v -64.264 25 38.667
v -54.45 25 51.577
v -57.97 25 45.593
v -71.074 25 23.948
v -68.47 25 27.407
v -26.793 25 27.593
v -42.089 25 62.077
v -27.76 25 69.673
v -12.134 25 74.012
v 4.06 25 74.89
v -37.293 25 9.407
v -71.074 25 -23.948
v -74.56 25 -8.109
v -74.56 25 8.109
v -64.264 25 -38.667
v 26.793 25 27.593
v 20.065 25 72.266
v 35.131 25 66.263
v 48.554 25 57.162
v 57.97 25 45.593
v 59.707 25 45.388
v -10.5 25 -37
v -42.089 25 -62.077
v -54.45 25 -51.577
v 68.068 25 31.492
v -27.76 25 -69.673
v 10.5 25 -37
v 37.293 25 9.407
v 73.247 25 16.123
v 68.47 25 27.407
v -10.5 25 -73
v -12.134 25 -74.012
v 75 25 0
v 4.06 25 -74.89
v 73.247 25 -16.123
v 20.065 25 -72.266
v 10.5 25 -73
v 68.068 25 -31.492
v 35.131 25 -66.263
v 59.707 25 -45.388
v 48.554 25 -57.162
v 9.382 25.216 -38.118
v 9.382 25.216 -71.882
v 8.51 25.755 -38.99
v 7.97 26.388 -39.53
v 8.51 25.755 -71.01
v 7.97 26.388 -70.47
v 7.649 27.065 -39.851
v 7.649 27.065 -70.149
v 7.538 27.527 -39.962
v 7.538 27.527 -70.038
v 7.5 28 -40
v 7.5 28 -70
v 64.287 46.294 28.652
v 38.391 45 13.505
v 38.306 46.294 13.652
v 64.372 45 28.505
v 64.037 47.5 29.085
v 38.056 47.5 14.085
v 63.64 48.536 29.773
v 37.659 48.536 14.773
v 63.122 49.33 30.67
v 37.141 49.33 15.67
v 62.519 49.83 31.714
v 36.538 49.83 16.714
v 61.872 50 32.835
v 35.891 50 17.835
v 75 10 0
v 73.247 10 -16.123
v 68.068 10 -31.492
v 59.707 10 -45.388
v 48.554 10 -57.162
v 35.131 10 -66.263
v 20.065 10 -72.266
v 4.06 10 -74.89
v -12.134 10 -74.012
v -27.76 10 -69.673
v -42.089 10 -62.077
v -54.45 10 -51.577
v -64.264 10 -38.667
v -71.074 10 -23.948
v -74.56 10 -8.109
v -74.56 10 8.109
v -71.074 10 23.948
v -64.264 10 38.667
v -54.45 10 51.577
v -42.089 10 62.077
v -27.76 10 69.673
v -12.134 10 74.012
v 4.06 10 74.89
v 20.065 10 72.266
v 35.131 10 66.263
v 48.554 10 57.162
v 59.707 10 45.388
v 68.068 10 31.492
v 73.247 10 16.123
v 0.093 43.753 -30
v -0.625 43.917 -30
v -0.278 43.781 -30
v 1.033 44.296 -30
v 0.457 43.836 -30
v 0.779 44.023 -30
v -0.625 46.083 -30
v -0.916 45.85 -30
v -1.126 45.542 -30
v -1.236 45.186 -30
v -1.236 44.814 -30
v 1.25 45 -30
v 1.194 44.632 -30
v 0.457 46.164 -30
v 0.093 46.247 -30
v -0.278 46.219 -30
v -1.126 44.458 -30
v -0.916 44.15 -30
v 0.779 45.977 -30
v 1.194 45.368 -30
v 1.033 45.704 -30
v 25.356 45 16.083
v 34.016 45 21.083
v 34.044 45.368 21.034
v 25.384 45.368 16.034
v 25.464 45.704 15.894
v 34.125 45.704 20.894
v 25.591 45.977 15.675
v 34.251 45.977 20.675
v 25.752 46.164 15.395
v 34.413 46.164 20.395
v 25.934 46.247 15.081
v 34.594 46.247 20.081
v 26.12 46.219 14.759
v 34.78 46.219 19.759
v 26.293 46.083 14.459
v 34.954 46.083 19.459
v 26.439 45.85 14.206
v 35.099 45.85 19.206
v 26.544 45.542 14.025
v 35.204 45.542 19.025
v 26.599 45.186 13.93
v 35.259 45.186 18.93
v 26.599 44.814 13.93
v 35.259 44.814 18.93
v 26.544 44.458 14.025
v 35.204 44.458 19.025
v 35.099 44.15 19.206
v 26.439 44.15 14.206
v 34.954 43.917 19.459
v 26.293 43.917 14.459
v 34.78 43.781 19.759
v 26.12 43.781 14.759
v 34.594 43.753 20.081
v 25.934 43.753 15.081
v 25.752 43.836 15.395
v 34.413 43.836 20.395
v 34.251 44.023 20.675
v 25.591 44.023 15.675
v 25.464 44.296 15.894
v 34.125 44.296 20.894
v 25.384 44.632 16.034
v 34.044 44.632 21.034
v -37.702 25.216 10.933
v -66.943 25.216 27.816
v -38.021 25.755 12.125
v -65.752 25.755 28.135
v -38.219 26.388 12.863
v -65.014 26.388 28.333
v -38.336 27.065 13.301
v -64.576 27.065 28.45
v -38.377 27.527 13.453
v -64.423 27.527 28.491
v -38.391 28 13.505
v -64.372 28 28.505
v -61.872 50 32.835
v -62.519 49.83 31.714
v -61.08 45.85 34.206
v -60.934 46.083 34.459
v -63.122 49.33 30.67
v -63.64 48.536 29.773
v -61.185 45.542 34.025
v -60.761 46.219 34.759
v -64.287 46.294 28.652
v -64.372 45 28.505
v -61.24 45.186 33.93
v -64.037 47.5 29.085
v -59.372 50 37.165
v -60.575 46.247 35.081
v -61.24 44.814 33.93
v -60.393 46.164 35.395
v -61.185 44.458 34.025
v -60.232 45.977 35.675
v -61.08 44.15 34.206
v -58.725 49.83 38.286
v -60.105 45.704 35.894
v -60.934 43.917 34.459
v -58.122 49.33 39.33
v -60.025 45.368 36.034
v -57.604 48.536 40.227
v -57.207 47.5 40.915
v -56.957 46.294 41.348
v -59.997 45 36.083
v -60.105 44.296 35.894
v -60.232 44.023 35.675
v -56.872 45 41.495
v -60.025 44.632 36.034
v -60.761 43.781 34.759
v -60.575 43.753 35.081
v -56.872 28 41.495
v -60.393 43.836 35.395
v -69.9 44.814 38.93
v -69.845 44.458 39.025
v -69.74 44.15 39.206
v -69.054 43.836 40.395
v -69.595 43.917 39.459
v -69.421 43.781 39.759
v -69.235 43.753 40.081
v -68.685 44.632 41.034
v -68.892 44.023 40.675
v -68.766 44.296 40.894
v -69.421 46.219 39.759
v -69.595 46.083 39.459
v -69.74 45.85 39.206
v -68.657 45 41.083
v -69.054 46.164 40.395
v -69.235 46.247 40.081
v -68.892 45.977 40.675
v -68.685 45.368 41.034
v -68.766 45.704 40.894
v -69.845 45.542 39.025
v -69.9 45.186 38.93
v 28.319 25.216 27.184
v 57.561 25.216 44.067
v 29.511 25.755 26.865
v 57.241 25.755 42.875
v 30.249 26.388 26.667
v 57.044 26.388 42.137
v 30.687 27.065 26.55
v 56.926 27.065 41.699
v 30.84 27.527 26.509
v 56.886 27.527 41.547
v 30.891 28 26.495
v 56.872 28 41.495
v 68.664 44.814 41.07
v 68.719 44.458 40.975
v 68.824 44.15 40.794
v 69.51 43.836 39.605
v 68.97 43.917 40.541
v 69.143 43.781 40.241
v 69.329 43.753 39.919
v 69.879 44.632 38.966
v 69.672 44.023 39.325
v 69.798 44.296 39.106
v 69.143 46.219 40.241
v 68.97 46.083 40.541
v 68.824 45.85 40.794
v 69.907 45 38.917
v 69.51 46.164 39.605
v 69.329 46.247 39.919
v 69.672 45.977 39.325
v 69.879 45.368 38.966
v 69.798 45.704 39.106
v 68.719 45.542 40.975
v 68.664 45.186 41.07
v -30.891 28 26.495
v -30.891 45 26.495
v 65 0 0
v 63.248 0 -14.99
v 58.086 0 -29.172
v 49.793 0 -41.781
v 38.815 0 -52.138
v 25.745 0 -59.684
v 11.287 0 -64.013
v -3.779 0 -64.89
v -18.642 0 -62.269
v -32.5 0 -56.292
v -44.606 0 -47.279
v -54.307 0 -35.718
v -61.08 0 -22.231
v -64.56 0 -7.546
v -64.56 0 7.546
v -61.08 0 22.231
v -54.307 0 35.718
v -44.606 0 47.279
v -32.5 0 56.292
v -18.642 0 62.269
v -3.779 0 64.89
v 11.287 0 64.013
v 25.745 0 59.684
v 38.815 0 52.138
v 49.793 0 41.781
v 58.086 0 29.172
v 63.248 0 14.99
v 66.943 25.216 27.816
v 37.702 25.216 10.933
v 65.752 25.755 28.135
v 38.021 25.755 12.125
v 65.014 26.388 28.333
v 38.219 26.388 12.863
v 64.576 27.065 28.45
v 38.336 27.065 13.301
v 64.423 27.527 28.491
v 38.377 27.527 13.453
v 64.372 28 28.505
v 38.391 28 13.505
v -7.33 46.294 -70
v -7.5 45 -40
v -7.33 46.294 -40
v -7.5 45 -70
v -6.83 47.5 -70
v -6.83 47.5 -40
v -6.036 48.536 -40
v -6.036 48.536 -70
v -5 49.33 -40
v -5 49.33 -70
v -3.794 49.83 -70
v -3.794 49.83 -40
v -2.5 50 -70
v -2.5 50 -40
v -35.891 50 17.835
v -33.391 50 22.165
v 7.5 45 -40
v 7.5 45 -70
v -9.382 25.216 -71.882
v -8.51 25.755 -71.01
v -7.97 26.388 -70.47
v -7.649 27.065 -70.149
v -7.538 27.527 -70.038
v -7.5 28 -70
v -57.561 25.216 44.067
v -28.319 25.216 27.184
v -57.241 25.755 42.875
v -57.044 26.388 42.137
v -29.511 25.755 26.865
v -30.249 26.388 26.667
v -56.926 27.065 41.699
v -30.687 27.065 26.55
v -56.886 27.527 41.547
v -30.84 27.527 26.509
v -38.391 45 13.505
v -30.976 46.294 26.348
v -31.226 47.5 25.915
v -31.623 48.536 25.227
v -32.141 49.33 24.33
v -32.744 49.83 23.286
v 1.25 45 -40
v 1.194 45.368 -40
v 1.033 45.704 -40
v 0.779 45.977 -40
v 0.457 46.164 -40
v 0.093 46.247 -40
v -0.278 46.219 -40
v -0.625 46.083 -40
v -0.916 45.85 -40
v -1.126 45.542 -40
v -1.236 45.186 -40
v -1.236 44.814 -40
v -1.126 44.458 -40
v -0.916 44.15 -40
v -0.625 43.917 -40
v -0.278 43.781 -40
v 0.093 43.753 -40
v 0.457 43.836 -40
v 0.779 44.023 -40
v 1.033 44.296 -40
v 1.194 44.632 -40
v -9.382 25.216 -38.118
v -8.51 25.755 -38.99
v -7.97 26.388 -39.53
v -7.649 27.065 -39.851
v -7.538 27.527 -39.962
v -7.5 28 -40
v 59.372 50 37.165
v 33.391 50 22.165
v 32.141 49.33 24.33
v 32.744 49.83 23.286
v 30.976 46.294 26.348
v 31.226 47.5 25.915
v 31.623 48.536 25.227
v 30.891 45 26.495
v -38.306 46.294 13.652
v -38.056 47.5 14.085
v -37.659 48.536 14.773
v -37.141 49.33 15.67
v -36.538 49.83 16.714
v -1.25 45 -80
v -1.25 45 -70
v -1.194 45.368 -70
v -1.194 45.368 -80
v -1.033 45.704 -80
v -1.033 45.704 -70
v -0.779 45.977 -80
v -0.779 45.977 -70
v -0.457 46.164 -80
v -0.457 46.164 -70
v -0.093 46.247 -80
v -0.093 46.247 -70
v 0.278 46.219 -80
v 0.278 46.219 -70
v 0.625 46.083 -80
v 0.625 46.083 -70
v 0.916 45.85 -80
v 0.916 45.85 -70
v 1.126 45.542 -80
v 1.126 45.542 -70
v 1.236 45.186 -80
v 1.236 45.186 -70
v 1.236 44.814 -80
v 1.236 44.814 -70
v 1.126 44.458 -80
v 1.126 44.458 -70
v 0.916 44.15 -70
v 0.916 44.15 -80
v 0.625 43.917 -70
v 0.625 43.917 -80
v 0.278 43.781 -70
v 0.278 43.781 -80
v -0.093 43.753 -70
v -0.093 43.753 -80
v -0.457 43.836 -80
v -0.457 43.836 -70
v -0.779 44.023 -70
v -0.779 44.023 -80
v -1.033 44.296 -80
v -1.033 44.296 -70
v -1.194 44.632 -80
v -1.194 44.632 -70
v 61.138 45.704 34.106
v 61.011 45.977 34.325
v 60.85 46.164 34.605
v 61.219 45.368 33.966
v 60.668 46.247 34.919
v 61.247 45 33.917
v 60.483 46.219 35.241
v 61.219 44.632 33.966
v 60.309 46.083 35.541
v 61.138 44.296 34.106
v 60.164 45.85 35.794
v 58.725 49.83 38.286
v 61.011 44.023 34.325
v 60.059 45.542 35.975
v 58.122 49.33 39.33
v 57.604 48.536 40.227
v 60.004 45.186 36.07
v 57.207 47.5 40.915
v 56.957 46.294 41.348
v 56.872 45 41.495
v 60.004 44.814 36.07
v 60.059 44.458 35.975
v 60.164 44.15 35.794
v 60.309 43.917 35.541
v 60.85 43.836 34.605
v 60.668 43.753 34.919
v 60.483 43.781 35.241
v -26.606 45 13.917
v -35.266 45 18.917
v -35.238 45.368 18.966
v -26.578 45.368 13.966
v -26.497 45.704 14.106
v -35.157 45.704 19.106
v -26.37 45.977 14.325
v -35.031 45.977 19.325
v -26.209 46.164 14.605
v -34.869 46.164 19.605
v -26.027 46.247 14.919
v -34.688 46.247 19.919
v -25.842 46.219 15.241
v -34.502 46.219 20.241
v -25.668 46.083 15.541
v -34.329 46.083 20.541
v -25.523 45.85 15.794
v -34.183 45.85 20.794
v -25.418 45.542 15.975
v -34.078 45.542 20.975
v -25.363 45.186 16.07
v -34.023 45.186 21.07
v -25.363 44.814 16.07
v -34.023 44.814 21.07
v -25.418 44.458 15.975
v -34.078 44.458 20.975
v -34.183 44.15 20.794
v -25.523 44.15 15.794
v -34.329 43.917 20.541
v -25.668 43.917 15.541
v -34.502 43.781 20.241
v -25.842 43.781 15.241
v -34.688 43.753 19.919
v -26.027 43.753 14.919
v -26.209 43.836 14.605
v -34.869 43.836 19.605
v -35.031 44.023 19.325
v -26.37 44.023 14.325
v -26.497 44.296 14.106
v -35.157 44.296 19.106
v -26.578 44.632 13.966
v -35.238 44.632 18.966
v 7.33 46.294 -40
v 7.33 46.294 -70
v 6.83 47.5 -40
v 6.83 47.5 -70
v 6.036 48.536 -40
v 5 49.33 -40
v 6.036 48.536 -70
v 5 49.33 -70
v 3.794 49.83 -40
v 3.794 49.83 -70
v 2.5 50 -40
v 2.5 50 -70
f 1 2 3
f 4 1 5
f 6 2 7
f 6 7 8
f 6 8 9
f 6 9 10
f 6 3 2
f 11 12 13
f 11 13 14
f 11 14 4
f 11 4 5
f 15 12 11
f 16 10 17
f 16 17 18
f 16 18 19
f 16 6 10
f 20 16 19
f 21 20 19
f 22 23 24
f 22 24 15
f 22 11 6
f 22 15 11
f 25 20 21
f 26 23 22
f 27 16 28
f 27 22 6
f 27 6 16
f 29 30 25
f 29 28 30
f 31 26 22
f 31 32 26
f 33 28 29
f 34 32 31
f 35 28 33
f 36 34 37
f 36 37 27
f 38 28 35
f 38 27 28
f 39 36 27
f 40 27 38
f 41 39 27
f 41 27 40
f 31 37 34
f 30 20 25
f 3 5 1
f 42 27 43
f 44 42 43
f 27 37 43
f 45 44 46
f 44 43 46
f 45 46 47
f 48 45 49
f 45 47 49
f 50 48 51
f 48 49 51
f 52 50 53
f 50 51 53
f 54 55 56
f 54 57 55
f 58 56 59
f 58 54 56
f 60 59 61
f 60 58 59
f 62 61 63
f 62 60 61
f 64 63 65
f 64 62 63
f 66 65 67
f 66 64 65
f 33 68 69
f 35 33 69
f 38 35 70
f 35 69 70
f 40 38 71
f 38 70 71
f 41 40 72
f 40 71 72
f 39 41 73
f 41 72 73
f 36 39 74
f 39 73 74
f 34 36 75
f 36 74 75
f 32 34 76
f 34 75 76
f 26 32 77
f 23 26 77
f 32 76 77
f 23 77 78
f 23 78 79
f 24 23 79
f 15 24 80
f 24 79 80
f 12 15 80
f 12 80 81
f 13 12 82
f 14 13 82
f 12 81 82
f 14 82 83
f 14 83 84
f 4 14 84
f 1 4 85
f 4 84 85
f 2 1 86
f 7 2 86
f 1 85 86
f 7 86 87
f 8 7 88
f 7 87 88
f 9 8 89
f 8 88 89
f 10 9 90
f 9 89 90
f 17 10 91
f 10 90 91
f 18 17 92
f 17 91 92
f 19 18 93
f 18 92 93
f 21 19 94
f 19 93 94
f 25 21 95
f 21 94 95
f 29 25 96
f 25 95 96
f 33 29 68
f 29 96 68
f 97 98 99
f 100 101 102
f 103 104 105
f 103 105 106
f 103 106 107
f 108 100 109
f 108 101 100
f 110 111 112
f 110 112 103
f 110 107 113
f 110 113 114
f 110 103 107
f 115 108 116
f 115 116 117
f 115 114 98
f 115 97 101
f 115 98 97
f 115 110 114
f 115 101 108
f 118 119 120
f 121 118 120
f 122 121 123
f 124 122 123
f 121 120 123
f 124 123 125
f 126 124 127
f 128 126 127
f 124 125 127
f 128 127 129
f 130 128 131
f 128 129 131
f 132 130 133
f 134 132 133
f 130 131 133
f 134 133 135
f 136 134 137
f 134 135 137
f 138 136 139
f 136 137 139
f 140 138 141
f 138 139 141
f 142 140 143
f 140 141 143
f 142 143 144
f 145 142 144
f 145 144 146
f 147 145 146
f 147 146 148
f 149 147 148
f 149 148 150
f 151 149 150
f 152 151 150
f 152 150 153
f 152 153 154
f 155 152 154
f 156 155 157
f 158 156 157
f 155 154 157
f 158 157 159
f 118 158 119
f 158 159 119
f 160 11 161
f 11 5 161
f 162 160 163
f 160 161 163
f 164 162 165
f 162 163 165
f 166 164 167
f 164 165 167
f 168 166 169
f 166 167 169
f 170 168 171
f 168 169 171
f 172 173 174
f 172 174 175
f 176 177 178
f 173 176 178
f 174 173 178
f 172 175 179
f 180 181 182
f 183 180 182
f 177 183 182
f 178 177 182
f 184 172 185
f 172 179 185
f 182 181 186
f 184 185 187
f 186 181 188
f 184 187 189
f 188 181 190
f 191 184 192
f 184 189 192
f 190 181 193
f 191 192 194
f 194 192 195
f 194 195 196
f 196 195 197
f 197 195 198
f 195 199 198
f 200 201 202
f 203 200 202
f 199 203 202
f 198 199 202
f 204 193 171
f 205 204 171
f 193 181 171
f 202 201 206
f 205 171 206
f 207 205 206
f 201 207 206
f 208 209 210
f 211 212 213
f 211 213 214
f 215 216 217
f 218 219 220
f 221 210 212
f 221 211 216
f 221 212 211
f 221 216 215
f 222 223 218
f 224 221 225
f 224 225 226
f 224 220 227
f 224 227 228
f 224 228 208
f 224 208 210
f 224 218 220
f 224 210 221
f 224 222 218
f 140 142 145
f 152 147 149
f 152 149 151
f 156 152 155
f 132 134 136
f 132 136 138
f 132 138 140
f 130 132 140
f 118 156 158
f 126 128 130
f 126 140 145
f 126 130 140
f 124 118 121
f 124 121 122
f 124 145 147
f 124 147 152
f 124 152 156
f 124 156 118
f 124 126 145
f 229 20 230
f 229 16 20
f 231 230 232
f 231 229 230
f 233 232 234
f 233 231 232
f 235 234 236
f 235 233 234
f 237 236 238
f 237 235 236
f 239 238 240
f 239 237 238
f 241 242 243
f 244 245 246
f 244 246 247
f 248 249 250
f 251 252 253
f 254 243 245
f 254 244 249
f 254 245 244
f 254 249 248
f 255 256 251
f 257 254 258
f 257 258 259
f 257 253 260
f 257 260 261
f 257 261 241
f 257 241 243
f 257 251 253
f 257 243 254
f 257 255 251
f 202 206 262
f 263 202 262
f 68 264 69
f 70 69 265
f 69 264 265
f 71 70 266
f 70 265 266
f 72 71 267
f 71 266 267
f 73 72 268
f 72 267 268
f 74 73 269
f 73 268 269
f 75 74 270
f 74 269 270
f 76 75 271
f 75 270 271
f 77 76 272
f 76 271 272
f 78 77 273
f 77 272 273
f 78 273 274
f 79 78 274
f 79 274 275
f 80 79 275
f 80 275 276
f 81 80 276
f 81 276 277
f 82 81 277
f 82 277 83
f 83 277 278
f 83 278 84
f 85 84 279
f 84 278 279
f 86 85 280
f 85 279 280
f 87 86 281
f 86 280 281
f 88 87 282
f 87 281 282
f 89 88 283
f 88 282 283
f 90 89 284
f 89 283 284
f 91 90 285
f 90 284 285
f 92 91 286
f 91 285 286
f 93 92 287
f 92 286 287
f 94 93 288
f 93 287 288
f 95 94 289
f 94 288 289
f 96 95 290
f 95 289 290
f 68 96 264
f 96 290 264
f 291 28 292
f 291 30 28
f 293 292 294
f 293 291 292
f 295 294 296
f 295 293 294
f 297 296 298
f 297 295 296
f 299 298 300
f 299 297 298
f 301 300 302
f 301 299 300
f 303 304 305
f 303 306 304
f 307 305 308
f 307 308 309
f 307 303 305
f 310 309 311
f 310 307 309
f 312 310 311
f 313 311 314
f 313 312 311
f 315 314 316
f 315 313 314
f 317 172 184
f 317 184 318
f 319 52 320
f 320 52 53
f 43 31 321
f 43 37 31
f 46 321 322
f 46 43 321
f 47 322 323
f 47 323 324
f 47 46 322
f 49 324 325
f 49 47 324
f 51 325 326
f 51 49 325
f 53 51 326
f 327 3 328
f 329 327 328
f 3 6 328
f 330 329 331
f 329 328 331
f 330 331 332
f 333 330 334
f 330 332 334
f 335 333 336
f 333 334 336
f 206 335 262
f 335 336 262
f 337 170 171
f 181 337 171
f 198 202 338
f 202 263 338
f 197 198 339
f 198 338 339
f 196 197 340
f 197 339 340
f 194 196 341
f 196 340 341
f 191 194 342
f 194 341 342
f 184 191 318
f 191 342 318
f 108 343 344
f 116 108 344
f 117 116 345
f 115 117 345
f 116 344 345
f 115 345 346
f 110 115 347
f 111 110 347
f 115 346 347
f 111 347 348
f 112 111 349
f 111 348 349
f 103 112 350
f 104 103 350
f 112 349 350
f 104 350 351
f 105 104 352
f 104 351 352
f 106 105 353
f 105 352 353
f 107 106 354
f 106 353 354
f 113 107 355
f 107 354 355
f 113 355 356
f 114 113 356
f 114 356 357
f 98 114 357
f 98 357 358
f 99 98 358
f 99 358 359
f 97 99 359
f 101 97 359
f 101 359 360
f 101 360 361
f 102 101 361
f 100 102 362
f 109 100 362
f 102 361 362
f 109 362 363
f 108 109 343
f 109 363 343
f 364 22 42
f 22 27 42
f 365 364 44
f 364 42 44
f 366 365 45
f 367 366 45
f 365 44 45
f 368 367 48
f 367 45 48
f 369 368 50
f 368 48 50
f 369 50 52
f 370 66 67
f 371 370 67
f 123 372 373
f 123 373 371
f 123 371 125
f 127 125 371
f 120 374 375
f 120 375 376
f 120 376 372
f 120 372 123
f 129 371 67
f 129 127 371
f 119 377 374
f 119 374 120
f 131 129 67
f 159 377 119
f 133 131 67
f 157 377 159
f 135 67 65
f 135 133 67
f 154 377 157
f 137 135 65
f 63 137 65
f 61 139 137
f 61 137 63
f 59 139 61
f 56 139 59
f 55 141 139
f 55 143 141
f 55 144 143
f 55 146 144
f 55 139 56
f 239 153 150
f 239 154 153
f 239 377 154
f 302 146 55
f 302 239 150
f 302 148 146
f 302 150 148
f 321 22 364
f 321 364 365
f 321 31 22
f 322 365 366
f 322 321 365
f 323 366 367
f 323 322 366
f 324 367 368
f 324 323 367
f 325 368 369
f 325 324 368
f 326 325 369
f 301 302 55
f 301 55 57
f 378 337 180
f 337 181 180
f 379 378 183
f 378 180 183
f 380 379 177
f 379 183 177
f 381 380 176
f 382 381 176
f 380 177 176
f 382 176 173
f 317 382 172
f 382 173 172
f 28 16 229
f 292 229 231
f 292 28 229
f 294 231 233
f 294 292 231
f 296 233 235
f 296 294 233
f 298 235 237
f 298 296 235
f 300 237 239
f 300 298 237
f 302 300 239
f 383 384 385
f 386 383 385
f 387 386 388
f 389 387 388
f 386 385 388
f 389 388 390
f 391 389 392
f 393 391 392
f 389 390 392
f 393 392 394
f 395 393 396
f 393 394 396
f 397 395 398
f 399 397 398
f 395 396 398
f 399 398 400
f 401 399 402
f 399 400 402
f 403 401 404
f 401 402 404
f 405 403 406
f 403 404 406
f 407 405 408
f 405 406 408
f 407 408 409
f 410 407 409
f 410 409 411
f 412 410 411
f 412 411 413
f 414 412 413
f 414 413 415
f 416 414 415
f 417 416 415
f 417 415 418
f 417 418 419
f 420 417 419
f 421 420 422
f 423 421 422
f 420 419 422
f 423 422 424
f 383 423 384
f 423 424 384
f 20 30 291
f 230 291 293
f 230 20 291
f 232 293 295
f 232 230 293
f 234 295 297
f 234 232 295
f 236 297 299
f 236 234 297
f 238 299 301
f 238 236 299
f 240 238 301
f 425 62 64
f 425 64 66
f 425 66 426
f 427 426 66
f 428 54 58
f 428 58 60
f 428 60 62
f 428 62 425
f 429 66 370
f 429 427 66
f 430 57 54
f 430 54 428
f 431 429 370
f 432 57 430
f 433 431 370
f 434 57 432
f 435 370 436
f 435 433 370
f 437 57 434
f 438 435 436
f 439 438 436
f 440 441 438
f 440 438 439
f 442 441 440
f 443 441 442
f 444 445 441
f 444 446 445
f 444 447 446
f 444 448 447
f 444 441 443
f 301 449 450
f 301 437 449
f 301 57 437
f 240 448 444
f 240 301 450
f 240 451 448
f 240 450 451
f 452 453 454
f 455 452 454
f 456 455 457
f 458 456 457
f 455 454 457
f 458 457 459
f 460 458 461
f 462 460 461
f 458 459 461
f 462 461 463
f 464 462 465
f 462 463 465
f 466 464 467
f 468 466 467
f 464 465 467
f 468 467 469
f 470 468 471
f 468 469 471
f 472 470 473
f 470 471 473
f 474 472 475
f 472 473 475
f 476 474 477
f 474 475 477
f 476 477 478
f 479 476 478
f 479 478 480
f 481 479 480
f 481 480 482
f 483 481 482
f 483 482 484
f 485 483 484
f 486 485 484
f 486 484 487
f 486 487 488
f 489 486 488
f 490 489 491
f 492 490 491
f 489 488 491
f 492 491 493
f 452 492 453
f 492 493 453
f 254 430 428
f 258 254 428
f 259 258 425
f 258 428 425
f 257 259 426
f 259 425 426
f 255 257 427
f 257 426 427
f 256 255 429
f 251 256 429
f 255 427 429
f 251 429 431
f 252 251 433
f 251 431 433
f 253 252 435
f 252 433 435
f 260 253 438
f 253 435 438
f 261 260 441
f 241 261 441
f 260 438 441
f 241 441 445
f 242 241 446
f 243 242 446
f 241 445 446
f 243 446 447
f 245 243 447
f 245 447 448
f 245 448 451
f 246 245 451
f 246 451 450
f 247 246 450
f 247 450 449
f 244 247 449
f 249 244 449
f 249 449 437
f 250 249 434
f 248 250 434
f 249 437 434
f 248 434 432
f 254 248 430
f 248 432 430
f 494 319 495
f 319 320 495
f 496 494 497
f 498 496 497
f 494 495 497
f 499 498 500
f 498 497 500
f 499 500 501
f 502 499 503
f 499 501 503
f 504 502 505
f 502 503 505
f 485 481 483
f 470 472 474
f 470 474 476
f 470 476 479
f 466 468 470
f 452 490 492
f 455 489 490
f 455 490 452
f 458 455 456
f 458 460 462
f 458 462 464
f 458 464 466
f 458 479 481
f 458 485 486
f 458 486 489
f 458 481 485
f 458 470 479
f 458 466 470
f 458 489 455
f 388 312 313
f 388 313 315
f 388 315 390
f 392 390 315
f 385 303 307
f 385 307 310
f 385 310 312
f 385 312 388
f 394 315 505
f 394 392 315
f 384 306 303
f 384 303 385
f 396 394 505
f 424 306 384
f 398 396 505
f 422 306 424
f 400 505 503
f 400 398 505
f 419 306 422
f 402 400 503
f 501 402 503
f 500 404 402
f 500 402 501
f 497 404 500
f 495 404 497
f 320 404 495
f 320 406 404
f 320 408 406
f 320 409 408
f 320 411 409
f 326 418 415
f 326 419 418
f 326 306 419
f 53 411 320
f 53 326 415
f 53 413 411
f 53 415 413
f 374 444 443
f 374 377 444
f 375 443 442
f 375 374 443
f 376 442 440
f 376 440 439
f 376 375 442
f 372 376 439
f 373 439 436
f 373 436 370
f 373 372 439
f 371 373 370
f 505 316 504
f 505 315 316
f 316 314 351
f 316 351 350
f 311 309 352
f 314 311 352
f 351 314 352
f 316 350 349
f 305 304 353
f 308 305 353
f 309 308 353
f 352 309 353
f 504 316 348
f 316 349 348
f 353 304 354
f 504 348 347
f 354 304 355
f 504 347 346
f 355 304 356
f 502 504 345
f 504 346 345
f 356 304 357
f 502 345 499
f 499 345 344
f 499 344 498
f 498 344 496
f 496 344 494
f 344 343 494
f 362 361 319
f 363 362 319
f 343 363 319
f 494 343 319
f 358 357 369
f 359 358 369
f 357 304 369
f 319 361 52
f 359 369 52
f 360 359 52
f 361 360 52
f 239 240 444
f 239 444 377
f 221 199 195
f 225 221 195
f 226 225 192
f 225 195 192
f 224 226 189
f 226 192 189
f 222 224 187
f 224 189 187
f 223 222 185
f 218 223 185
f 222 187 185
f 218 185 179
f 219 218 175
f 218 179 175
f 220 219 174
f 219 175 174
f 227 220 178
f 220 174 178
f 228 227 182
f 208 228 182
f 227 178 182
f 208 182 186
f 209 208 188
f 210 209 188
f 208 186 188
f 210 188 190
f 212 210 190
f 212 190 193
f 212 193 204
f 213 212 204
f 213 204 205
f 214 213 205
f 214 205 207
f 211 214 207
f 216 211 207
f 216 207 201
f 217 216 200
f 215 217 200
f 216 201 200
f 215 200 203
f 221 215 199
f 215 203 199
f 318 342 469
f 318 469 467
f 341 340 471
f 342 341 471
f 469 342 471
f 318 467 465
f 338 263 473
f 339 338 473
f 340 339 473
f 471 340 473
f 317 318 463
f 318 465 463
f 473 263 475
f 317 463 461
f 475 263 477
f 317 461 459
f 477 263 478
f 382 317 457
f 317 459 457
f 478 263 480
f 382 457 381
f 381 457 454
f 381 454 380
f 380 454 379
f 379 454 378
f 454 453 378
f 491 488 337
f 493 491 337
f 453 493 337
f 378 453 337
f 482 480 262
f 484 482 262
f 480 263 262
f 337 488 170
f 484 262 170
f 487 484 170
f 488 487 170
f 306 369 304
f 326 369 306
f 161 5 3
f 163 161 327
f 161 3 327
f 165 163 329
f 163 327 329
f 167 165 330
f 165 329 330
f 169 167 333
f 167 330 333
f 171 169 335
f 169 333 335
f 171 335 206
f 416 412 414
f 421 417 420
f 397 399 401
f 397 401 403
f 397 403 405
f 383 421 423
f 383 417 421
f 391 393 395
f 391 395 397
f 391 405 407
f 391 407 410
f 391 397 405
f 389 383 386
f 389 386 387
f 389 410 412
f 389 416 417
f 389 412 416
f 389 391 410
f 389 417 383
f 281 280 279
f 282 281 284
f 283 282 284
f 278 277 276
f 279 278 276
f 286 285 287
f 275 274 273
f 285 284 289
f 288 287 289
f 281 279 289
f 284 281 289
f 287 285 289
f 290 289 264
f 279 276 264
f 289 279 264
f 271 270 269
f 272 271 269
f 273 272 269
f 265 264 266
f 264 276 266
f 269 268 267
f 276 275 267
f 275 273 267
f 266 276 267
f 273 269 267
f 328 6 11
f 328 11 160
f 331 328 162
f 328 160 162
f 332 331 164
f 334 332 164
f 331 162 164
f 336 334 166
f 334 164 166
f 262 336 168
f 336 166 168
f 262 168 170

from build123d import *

# Parameters (mm, degrees)
SKETCH1_R           = 75
BOSS_EXTRUDE1_DEPTH = 25
SKETCH2_W           = 15
SKETCH2_H           = 30
BOSS_EXTRUDE2_DEPTH = 25
FILLET1_R           = 3
FILLET2_R           = 5
SKETCH3_R           = 1.25
BOSS_EXTRUDE3_DEPTH = 10
SKETCH4_R           = 1.25
BOSS_EXTRUDE4_DEPTH = 10
SKETCH5_R           = 1.25
BOSS_EXTRUDE5_DEPTH = 10
SKETCH6_R           = 1.25
BOSS_EXTRUDE6_DEPTH = 10
SKETCH7_R           = 1.25
BOSS_EXTRUDE7_DEPTH = 10
SKETCH8_R           = 1.25
BOSS_EXTRUDE8_DEPTH = 10
CHAMFER1_SIZE       = 10


with BuildPart() as part:
    # Sketch1 → Boss-Extrude1 (new body)
    with BuildSketch(Plane(origin=(0, 0, 0), x_dir=(1, 0, 0), z_dir=(0, 1, 0))):
        Circle(SKETCH1_R)
    extrude(amount=BOSS_EXTRUDE1_DEPTH)

    # Sketch2 → Boss-Extrude2 (add)
    with BuildSketch(Plane(origin=(0, 25, 0), x_dir=(1, 0, 0), z_dir=(0, 1, 0))):
        Polygon((-64.371778265, -28.504809472), (-56.871778265, -41.495190528), (-30.891016151, -26.495190528), (-38.391016151, -13.504809472), align=None)
        with Locations((0, 55)):
            Rectangle(SKETCH2_W, SKETCH2_H)
        Polygon((64.371778265, -28.504809472), (56.871778265, -41.495190528), (30.891016151, -26.495190528), (38.391016151, -13.504809472), align=None)
    extrude(amount=BOSS_EXTRUDE2_DEPTH)

    # Fillet1
    fillet1_edges = [part.edges().sort_by_distance(p)[0] for p in [
        (-7.5, 25, -55),
        (0, 25, -40),
        (7.5, 25, -55),
        (0, 25, -70),
        (51.381397208, 25, 21.004809472),
        (34.641016151, 25, 20),
        (43.881397208, 25, 33.995190528),
        (60.621778265, 25, 35),
        (-51.381397208, 25, 21.004809472),
        (-60.621778265, 25, 35),
        (-43.881397208, 25, 33.995190528),
        (-34.641016151, 25, 20),
    ]]
    fillet(fillet1_edges, radius=FILLET1_R)

    # Fillet2
    fillet2_edges = [part.edges().sort_by_distance(p)[0] for p in [
        (-7.5, 50, -55),
        (7.5, 50, -55),
        (51.381397208, 50, 21.004809472),
        (43.881397208, 50, 33.995190528),
        (-51.381397208, 50, 21.004809472),
        (-43.881397208, 50, 33.995190528),
    ]]
    fillet(fillet2_edges, radius=FILLET2_R)

    # Sketch3 → Boss-Extrude3 (add)
    with BuildSketch(Plane(origin=(60.621778265, 0, 35), x_dir=(0.5, 0, -0.866025404), z_dir=(0.866025404, 0, 0.5))):
        with Locations((0, 45)):
            Circle(SKETCH3_R)
    extrude(amount=BOSS_EXTRUDE3_DEPTH)

    # Sketch4 → Boss-Extrude4 (add)
    with BuildSketch(Plane(origin=(34.641016151, 0, 20), x_dir=(-0.5, 0, 0.866025404), z_dir=(-0.866025404, 0, -0.5))):
        with Locations((0, 45)):
            Circle(SKETCH4_R)
    extrude(amount=BOSS_EXTRUDE4_DEPTH)

    # Sketch5 → Boss-Extrude5 (add)
    with BuildSketch(Plane(origin=(0, 0, -70), x_dir=(-1, 0, 0), z_dir=(0, 0, -1))):
        with Locations((0, 45)):
            Circle(SKETCH5_R)
    extrude(amount=BOSS_EXTRUDE5_DEPTH)

    # Sketch6 → Boss-Extrude6 (add)
    with BuildSketch(Plane.XY.offset(-40)):
        with Locations((0, 45)):
            Circle(SKETCH6_R)
    extrude(amount=BOSS_EXTRUDE6_DEPTH)

    # Sketch7 → Boss-Extrude7 (add)
    with BuildSketch(Plane(origin=(-60.621778265, 0, 35), x_dir=(0.5, 0, 0.866025404), z_dir=(-0.866025404, 0, 0.5))):
        with Locations((0, 45)):
            Circle(SKETCH7_R)
    extrude(amount=BOSS_EXTRUDE7_DEPTH)

    # Sketch8 → Boss-Extrude8 (add)
    with BuildSketch(Plane(origin=(-34.641016151, 0, 20), x_dir=(-0.5, 0, -0.866025404), z_dir=(0.866025404, 0, -0.5))):
        with Locations((0, 45)):
            Circle(SKETCH8_R)
    extrude(amount=BOSS_EXTRUDE8_DEPTH)

    # Chamfer1
    chamfer1_edges = [part.edges().sort_by_distance(p)[0] for p in [
        (-75, 0, 0),
    ]]
    chamfer(chamfer1_edges, length=CHAMFER1_SIZE)


solid = part.part
